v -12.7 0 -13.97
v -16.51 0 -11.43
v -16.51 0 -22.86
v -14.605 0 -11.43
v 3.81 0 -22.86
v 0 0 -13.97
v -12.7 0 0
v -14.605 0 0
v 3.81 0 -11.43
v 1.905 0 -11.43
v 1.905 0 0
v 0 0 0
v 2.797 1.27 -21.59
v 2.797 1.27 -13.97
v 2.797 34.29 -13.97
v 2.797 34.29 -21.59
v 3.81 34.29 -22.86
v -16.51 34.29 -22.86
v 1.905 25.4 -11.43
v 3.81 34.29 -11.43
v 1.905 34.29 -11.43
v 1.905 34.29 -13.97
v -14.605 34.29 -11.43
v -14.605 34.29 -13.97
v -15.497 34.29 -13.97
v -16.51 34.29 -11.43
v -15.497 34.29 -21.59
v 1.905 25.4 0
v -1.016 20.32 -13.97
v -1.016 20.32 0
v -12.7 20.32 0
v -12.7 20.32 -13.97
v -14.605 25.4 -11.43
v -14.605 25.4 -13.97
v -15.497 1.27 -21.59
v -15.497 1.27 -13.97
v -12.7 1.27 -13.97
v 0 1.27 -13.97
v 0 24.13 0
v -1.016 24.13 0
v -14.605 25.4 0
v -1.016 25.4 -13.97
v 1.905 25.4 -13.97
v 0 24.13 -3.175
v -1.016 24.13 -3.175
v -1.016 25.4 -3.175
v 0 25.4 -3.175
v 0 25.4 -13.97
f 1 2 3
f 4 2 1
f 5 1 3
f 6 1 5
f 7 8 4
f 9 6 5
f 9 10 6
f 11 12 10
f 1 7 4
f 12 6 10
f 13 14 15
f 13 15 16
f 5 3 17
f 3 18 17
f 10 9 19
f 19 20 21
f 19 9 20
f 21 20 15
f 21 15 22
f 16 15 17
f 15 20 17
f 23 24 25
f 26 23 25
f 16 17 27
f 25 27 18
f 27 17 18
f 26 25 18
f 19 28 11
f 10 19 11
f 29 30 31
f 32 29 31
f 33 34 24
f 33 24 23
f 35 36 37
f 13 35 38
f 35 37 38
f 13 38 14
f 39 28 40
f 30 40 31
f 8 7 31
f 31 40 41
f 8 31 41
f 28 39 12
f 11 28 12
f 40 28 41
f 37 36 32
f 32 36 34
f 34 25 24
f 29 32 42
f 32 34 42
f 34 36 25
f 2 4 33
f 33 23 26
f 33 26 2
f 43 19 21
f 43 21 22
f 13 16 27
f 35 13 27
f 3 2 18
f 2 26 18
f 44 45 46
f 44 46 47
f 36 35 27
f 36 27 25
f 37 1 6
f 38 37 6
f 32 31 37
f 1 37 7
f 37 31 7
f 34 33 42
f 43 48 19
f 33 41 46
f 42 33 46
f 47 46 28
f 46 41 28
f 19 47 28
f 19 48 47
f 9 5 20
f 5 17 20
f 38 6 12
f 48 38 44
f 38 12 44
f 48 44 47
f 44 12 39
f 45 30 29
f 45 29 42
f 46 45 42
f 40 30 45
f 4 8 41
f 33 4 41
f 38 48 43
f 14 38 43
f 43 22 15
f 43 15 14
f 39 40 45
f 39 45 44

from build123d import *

# Parameters (mm, degrees)
BOSS_EXTRUDE1_DEPTH      = 13.97
SKETCH3_W                = 1.016
SKETCH3_H                = 3.81
CUT_EXTRUDE1_DEPTH       = 14.97
CUT_EXTRUDE2_DEPTH       = 2.27
BOSS_EXTRUDE3_DEPTH      = 8.89
BOSS_EXTRUDE3_DEPTH_BACK = 25.4
SKETCH12_W               = 18.294327288
SKETCH12_H               = 7.62
BOSS_EXTRUDE4_DEPTH      = 1.27


with BuildPart() as part:
    # Sketch1 → Boss-Extrude1 (new body)
    with BuildSketch(Plane.XY):
        Polygon((0, 0), (0, 20.32), (-12.7, 20.32), (-12.7, 0), (-14.605, 0), (-14.605, 25.4), (1.905, 25.4), (1.905, 0), align=None)
    extrude(amount=-BOSS_EXTRUDE1_DEPTH)

    # Sketch3 → Cut-Extrude1 (cut, through all)
    with BuildSketch(Plane.XY):
        with Locations((-0.508, 22.225)):
            Rectangle(SKETCH3_W, SKETCH3_H)
    extrude(amount=-CUT_EXTRUDE1_DEPTH, mode=Mode.SUBTRACT)

    # Sketch4 → Cut-Extrude2 (cut, through all)
    with BuildSketch(Plane.XZ.offset(-24.13)):
        Polygon((-1.016, -6.985), (-1.016, -3.175), (0, -3.175), (0, -13.97), (-1.016, -13.97), align=None)
    extrude(amount=-CUT_EXTRUDE2_DEPTH, mode=Mode.SUBTRACT)

    # Sketch11 → Boss-Extrude3 (add, two sides)
    with BuildSketch(Plane(origin=(0, 25.4, 0), x_dir=(1, 0, 0), z_dir=(0, 1, 0))) as boss_extrude3_sk:
        Polygon((-15.497163644, 13.97), (-14.605, 13.97), (-14.605, 11.43), (-16.51, 11.43), (-16.51, 22.86), (3.81, 22.86), (3.81, 11.43), (1.905, 11.43), (1.905, 13.97), (2.797163644, 13.97), (2.797163644, 21.59), (-15.497163644, 21.59), align=None)
    extrude(amount=BOSS_EXTRUDE3_DEPTH)
    extrude(boss_extrude3_sk.sketch, amount=-BOSS_EXTRUDE3_DEPTH_BACK)

    # Sketch12 → Boss-Extrude4 (add)
    with BuildSketch(Plane.XZ):
        with Locations((-6.35, -17.78)):
            Rectangle(SKETCH12_W, SKETCH12_H)
    extrude(amount=-BOSS_EXTRUDE4_DEPTH)


solid = part.part
